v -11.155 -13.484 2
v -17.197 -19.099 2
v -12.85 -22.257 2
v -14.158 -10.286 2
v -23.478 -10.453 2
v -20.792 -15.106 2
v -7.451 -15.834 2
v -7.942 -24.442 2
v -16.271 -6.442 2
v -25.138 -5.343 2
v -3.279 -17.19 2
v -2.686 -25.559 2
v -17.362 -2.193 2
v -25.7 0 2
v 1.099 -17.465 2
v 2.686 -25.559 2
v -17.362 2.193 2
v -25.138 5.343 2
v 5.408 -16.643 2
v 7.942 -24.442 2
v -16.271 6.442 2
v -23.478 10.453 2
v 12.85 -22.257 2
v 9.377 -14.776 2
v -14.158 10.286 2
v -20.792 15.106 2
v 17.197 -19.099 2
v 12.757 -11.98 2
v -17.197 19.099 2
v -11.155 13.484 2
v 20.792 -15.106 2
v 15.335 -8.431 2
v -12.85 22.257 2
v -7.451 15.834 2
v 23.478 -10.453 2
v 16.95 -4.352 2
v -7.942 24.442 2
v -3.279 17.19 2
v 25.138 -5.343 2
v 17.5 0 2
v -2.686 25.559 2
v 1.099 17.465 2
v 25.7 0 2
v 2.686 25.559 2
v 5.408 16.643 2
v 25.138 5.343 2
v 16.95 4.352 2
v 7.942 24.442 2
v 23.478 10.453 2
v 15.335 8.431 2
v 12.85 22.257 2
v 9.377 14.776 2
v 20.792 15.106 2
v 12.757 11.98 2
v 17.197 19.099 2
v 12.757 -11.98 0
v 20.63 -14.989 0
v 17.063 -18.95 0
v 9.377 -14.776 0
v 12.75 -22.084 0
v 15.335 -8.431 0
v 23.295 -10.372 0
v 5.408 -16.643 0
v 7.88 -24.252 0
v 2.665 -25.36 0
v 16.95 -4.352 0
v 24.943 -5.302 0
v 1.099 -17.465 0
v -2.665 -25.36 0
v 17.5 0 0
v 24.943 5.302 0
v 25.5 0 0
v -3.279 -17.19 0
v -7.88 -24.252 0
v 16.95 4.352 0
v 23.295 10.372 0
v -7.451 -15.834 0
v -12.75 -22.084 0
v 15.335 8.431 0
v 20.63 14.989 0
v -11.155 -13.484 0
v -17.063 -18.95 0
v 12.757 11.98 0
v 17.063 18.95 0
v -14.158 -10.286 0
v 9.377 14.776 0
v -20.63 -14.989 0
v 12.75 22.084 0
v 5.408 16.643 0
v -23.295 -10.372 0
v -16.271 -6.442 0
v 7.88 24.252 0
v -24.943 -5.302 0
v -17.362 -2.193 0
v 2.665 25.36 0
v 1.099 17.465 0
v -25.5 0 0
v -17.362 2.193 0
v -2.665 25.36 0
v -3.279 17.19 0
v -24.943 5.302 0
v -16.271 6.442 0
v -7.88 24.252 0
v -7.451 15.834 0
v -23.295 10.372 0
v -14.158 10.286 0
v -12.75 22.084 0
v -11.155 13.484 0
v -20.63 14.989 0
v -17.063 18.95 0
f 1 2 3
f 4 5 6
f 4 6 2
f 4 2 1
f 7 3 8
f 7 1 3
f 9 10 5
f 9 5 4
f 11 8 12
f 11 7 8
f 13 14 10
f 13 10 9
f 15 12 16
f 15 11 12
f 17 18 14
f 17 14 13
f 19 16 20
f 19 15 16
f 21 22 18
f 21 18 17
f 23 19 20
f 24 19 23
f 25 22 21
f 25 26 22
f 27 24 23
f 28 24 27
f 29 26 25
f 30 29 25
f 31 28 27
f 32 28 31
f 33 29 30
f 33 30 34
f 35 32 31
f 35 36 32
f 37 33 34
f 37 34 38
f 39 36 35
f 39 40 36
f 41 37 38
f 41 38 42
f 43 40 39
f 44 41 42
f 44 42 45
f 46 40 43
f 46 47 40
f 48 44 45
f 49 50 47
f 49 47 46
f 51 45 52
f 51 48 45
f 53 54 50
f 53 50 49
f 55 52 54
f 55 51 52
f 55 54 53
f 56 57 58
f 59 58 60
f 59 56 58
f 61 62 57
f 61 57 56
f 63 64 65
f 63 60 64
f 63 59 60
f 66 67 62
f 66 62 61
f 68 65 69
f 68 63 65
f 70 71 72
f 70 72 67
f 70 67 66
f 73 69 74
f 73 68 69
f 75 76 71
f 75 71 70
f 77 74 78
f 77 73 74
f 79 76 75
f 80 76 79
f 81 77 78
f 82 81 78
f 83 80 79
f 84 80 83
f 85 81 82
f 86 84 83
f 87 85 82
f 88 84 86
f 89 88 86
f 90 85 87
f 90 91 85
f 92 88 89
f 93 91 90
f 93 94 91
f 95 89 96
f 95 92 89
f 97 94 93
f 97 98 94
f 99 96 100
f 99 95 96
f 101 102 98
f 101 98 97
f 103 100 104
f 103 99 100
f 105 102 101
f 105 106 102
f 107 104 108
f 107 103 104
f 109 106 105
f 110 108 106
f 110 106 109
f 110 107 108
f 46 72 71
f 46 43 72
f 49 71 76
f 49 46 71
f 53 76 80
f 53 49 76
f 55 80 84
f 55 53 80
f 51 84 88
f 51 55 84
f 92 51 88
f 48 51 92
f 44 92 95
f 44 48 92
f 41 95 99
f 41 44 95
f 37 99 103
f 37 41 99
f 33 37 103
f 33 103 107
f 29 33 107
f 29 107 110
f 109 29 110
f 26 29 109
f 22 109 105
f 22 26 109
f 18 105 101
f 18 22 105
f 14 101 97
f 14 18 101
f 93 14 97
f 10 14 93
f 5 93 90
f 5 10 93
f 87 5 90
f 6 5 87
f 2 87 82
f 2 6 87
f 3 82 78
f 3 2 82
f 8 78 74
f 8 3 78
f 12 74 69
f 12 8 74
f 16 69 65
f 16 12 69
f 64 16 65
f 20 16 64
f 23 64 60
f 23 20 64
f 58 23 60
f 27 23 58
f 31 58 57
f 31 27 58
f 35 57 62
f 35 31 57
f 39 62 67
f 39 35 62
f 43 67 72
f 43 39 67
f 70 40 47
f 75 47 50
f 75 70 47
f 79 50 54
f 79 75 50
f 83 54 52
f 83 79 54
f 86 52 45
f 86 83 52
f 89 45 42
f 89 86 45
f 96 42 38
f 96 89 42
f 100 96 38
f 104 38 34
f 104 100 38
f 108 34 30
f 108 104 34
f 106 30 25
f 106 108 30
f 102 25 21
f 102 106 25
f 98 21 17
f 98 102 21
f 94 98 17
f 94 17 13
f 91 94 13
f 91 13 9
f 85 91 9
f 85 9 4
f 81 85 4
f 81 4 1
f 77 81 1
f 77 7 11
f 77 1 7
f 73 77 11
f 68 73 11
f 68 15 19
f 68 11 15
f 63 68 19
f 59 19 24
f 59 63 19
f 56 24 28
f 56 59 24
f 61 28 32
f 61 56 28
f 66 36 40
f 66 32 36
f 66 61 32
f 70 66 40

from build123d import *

# Parameters (mm, degrees)
CYLINDER009_R     = 17.5
CYLINDER009_DEPTH = 10


with BuildPart() as cylinder009:
    # Cylinder009 → Cylinder009 (new body)
    with BuildSketch(Plane.XY):
        Circle(CYLINDER009_R)
    extrude(amount=CYLINDER009_DEPTH)


with BuildPart() as cut009:
    # Cone008 → Cone008 (revolve)
    with BuildSketch(Plane.XZ):
        Polygon((0, 0), (25.5, 0), (25.7, 2), (0, 2), align=None)
    revolve(axis=Axis((0, 0, 0), (0, 0, 1)))

    # Cut009: cut Cylinder009
    add(cylinder009.part, mode=Mode.SUBTRACT)


solid = cut009.part
